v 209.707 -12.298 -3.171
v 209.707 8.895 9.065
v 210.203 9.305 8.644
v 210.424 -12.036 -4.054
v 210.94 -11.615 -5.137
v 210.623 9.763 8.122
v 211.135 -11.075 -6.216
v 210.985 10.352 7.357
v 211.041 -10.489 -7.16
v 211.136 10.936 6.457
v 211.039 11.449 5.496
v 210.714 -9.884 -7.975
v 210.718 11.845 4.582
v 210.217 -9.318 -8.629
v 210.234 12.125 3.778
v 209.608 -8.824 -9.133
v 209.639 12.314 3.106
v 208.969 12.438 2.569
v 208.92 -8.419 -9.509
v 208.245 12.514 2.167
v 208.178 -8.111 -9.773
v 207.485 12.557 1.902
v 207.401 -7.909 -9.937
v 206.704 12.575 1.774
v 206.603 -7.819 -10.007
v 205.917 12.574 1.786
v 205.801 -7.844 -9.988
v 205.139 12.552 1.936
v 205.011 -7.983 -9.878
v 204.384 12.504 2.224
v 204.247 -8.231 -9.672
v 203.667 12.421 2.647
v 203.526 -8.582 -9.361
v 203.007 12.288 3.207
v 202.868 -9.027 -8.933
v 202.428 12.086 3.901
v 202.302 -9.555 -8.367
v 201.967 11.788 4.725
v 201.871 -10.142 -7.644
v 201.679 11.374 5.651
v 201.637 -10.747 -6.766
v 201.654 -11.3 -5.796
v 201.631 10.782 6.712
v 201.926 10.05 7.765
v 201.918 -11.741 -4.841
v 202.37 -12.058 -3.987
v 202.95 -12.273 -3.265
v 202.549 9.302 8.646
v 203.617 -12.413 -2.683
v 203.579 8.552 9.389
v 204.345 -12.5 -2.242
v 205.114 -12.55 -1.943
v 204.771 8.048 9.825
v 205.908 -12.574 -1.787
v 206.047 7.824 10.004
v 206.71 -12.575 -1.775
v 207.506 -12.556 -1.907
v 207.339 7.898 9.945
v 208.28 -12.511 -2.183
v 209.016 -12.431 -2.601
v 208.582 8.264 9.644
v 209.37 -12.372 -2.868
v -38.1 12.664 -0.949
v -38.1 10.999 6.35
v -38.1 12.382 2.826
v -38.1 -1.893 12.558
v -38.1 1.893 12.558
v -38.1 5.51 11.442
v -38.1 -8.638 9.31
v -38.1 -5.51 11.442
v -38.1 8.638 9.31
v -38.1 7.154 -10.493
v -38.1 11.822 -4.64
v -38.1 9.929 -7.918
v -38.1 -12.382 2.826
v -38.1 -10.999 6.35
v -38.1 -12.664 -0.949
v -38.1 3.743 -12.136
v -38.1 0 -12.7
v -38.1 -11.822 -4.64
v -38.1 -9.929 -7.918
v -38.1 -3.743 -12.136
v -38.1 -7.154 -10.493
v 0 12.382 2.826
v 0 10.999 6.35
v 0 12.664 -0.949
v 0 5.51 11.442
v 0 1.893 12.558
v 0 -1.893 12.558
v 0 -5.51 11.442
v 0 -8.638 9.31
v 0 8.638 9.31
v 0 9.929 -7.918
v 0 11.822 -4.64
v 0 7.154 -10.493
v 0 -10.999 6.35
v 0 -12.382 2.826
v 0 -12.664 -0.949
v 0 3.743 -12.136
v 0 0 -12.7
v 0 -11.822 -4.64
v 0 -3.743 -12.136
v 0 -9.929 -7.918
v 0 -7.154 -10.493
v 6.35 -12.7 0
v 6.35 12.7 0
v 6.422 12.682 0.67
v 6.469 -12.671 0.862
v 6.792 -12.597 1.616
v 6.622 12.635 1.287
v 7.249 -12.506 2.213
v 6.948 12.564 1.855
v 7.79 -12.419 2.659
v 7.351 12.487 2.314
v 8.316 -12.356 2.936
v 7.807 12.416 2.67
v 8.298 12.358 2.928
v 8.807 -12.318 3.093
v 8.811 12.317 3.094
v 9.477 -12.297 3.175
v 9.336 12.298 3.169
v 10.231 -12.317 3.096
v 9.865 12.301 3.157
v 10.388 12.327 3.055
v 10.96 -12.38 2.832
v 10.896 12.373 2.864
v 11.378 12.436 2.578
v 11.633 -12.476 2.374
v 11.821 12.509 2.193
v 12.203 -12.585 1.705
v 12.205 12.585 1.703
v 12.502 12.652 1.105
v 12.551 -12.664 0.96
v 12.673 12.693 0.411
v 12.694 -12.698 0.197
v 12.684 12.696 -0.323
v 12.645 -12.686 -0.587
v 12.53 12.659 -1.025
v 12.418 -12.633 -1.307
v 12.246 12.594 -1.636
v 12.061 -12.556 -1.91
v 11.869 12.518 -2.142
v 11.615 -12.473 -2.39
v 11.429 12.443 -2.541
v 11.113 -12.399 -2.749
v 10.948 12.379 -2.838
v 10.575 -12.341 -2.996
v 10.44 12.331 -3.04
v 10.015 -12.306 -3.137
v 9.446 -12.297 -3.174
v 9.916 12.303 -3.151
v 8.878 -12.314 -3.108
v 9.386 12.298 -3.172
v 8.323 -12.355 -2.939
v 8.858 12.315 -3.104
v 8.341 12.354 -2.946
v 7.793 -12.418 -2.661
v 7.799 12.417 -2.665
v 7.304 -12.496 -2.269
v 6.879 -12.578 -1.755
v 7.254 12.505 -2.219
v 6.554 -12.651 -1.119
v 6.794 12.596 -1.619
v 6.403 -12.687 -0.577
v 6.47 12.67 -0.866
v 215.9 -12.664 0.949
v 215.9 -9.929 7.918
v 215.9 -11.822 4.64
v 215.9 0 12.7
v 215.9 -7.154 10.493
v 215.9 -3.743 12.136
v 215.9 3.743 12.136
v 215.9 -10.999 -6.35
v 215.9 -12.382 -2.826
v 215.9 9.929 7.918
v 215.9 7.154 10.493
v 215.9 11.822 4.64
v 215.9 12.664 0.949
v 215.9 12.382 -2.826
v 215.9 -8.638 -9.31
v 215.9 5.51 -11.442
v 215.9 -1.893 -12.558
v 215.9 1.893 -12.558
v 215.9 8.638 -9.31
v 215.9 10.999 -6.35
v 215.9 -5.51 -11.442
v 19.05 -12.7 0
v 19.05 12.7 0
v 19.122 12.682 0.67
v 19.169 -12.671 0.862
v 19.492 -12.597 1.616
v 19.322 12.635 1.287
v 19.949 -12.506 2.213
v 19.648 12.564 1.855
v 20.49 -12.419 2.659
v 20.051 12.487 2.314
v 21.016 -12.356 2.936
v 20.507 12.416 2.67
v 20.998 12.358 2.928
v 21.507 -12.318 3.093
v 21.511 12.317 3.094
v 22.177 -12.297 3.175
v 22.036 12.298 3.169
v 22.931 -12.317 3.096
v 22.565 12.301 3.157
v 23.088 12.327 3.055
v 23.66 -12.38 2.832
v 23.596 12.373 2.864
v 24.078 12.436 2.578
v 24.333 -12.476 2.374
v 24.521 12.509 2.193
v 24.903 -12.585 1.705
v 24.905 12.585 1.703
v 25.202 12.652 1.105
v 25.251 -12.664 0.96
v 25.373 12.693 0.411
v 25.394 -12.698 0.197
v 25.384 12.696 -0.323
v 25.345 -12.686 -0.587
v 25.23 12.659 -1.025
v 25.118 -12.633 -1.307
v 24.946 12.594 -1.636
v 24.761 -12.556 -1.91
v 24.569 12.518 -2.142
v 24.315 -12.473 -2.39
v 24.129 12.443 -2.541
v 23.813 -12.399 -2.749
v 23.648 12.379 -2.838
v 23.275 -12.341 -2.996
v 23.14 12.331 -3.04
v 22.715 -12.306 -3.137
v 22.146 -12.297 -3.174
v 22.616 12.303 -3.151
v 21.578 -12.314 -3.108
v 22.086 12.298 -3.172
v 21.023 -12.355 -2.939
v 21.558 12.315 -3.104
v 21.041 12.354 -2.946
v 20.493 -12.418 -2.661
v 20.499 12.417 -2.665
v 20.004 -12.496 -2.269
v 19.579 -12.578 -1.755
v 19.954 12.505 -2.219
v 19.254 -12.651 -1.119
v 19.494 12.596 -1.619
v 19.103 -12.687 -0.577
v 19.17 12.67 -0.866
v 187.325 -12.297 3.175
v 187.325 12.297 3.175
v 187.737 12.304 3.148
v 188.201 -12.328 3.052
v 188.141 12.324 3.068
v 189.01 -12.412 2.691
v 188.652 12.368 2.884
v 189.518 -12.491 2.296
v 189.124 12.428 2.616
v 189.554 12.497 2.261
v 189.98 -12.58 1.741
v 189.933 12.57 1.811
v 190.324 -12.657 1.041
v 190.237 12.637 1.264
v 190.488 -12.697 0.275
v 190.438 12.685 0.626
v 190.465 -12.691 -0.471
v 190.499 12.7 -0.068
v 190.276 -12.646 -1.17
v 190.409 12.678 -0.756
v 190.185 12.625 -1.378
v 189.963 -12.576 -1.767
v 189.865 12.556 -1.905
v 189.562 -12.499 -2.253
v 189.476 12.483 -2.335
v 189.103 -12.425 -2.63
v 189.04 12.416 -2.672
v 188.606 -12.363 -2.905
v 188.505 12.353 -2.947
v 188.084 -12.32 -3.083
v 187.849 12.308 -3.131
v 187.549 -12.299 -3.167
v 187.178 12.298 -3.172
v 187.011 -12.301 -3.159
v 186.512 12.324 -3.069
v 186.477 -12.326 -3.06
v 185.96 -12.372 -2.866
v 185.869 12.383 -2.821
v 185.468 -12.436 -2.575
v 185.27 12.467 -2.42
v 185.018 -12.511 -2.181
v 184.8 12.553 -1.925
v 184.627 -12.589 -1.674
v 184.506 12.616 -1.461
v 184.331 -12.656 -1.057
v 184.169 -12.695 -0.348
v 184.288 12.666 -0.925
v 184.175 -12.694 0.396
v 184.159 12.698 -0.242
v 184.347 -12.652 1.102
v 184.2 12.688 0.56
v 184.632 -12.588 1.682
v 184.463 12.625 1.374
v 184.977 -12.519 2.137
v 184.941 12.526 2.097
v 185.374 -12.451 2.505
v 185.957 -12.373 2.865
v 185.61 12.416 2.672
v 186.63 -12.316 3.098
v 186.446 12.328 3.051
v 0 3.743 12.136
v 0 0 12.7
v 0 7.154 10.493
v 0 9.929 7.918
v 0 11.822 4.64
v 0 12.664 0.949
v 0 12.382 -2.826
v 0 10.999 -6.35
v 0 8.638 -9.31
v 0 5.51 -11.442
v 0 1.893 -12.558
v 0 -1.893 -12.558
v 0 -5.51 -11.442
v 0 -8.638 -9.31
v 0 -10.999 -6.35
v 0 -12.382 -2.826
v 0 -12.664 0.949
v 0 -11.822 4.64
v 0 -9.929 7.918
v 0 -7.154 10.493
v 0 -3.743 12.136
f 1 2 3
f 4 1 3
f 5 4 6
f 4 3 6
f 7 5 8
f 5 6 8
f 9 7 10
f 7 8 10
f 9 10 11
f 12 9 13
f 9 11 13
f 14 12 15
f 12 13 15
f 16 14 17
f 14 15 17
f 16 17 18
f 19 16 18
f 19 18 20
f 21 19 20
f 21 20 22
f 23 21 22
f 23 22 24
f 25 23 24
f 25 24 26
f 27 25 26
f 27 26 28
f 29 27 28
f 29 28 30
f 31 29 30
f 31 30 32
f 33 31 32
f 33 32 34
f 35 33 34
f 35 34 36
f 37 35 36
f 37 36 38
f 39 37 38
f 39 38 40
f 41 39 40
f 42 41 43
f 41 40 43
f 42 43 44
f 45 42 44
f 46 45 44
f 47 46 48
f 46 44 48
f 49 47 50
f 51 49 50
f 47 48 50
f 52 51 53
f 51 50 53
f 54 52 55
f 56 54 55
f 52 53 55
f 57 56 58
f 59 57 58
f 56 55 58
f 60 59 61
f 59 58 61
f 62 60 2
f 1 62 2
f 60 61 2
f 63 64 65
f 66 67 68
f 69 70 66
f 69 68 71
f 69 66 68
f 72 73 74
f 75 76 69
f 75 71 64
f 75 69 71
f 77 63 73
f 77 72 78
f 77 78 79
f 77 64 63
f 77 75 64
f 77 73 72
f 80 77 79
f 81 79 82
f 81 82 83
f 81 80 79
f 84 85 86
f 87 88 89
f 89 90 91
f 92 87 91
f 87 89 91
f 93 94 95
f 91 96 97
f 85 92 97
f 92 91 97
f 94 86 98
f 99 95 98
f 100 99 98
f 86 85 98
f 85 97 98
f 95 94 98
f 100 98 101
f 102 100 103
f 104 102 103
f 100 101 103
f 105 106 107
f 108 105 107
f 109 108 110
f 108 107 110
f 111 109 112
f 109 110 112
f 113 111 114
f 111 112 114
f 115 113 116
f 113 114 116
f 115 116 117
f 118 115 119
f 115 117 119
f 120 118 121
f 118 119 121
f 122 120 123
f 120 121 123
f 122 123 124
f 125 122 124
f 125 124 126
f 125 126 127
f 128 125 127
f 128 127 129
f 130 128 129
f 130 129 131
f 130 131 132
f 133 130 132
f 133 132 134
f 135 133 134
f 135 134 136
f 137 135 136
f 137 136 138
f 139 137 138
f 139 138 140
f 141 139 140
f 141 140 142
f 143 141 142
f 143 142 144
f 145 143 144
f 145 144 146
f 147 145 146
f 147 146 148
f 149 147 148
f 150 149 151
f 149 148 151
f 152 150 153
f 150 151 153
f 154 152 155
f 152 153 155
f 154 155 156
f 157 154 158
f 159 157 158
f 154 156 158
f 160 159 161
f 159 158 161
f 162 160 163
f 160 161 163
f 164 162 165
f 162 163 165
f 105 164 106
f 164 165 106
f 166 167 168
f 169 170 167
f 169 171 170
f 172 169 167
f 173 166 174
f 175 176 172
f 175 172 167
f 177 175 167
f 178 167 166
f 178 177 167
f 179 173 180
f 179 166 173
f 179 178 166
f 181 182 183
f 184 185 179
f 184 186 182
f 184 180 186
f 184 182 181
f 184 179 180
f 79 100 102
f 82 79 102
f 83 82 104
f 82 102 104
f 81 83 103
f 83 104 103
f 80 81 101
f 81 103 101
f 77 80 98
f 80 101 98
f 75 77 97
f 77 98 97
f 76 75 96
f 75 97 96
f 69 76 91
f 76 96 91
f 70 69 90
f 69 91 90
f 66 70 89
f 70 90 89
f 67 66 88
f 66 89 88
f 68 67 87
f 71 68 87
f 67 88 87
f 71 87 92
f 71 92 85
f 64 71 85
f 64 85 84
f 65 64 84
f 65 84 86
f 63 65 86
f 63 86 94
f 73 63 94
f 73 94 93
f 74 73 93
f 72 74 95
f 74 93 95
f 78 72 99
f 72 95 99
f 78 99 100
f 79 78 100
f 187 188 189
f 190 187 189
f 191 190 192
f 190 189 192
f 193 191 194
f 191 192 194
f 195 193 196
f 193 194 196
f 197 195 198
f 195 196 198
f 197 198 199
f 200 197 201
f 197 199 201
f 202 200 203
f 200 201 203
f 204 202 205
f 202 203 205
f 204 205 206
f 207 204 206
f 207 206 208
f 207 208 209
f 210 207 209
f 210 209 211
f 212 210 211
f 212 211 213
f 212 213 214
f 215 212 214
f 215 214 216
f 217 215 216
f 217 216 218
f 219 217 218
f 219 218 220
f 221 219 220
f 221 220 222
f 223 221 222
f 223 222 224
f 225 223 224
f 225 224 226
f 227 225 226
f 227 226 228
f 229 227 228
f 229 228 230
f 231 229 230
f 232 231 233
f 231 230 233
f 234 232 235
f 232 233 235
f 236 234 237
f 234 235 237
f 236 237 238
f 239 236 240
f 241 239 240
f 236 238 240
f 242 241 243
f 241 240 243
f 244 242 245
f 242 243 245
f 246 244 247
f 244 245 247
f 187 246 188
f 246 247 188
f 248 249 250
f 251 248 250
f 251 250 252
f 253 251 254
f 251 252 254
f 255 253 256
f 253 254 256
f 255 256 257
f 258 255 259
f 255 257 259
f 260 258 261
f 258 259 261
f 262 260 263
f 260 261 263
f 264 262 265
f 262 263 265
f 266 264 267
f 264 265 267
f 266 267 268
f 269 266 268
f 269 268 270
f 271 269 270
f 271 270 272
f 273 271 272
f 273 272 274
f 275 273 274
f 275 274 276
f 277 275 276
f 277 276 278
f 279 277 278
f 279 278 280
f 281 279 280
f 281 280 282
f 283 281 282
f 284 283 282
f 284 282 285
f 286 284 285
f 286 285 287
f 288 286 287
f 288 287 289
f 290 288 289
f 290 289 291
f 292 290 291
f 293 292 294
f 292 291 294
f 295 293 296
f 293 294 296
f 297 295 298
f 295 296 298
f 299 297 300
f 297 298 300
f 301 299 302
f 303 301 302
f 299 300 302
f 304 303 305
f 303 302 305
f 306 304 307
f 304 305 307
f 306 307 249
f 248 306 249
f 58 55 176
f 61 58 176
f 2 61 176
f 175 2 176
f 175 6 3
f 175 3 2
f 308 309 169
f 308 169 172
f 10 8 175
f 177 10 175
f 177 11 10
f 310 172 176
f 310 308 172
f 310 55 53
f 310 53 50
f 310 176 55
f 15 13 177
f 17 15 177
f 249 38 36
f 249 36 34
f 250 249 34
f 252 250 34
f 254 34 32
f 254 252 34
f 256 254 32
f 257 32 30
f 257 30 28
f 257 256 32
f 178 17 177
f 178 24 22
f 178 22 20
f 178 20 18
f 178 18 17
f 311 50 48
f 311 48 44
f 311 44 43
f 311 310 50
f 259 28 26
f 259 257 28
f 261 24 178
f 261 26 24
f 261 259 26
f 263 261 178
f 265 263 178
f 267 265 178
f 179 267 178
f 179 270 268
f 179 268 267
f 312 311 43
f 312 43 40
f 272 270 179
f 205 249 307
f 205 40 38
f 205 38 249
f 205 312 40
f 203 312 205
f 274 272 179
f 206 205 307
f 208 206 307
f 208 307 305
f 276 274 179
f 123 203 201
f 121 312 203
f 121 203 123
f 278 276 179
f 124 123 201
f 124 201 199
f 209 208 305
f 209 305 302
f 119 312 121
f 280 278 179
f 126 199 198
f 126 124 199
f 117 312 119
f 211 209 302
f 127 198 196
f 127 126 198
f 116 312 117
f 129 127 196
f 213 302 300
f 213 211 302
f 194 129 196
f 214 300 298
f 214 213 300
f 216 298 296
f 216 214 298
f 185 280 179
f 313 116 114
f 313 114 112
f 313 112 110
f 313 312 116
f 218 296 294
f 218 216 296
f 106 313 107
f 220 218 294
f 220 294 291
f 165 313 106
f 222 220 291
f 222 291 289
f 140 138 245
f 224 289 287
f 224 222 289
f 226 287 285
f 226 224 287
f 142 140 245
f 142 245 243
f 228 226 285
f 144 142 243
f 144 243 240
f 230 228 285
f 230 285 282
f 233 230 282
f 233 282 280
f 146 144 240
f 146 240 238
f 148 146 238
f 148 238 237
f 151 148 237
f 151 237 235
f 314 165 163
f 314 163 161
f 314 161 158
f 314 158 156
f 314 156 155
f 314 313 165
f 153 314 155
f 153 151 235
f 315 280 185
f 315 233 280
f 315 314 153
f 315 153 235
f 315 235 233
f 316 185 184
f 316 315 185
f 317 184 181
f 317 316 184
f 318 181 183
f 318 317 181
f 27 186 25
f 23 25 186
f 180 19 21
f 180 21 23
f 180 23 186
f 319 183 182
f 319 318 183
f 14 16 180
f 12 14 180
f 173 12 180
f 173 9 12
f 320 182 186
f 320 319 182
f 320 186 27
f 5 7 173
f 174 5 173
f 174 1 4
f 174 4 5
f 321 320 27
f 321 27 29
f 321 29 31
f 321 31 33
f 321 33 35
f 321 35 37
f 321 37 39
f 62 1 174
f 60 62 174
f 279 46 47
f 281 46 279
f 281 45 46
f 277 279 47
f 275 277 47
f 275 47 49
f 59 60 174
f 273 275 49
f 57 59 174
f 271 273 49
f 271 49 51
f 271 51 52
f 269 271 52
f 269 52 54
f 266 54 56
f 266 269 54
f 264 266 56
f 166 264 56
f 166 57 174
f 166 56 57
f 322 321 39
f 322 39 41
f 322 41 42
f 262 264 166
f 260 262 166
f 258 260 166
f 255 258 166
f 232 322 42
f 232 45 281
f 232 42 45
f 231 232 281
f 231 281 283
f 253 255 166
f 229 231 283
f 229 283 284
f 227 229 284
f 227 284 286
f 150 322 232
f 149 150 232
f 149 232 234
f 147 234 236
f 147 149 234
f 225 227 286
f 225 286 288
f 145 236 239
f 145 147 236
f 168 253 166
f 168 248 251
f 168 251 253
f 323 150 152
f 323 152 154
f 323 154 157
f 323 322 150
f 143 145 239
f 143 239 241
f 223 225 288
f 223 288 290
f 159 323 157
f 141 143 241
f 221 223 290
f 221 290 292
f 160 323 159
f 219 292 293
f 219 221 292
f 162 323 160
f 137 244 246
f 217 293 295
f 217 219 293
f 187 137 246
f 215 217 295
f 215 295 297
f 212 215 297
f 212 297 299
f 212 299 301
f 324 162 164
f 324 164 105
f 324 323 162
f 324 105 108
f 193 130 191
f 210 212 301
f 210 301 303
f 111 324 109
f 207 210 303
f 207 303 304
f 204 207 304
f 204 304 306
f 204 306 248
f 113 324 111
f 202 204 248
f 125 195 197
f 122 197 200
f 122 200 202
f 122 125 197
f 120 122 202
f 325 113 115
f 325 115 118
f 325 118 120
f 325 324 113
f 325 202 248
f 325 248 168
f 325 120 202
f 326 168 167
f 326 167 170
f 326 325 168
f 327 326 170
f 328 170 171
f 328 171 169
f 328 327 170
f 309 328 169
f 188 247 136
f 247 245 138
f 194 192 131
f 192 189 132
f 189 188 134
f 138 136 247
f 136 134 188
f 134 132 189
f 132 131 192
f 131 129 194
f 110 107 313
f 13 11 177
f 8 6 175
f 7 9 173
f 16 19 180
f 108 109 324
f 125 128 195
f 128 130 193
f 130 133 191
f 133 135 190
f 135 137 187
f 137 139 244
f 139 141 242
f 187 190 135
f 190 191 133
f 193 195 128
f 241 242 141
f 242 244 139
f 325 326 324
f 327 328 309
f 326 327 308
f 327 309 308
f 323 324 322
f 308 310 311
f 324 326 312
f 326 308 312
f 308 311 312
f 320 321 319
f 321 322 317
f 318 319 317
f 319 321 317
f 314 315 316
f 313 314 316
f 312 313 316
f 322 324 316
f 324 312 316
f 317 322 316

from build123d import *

# Parameters (mm, degrees)
BOSS_EXTRUDE1_DEPTH = 215.9
SKETCH2_R           = 3.175
CUT_EXTRUDE1_DEPTH  = 215.9
SKETCH3_R           = 4.7625
CUT_EXTRUDE2_DEPTH  = 215.9
SKETCH4_R           = 25.43506898
SKETCH4_R_2         = 12.7
CUT_EXTRUDE6_DEPTH  = 222.25
SKETCH5_R           = 12.7
BOSS_EXTRUDE2_DEPTH = 38.1
SKETCH6_R           = 12.7
CUT_EXTRUDE7_DEPTH  = 38.1
SKETCH7_R           = 12.7
BOSS_EXTRUDE3_DEPTH = 38.1


with BuildPart() as part:
    # Sketch1 → Boss-Extrude1 (new body)
    with BuildSketch(Plane(origin=(0, 0, 0), x_dir=(0, 0, -1), z_dir=(1, 0, 0))):
        Polygon((12.7, 3.402954744), (9.297045256, 9.297045256), (3.402954744, 12.7), (-3.402954744, 12.7), (-9.297045256, 9.297045256), (-12.7, 3.402954744), (-12.7, -3.402954744), (-9.297045256, -9.297045256), (-3.402954744, -12.7), (3.402954744, -12.7), (9.297045256, -9.297045256), (12.7, -3.402954744), align=None)
    extrude(amount=BOSS_EXTRUDE1_DEPTH)

    # Sketch2 → Cut-Extrude1 (cut)
    with BuildSketch(Plane(origin=(0, 12.7, 0), x_dir=(1, 0, 0), z_dir=(0, 1, 0))):
        with BuildLine():
            ThreePointArc((25.4, 0), (22.225, 3.175), (19.05, 0))
            Line((19.05, 0), (22.225, 0))
            Line((22.225, 0), (25.4, 0))
        make_face()
        with BuildLine():
            Line((22.225, 0), (19.05, 0))
            ThreePointArc((19.05, 0), (22.225, -3.175), (25.4, 0))
            Line((25.4, 0), (22.225, 0))
        make_face()
        with BuildLine():
            ThreePointArc((12.7, 0), (9.525, 3.175), (6.35, 0))
            Line((6.35, 0), (9.525, 0))
            Line((9.525, 0), (12.7, 0))
        make_face()
        with BuildLine():
            Line((9.525, 0), (6.35, 0))
            ThreePointArc((6.35, 0), (9.525, -3.175), (12.7, 0))
            Line((12.7, 0), (9.525, 0))
        make_face()
        with Locations(Location((187.325, 0, 0), (0, 0, 270))):
            Circle(SKETCH2_R)
    extrude(amount=-CUT_EXTRUDE1_DEPTH, mode=Mode.SUBTRACT)

    # Sketch3 → Cut-Extrude2 (cut)
    with BuildSketch(Plane(origin=(0, 10.998522628, 6.35), x_dir=(1, 0, 0), z_dir=(0, 0.8660254037844386, 0.5000000000000001))):
        with Locations(Location((206.375, 0, 0), (0, 0, 314.395209186))):
            Circle(SKETCH3_R)
    extrude(amount=-CUT_EXTRUDE2_DEPTH, mode=Mode.SUBTRACT)

    # Sketch4 → Cut-Extrude6 (cut)
    with BuildSketch(Plane.ZY):
        Circle(SKETCH4_R)
        Circle(SKETCH4_R_2, mode=Mode.SUBTRACT)
    extrude(amount=-CUT_EXTRUDE6_DEPTH, mode=Mode.SUBTRACT)


with BuildPart() as body_2:
    # Sketch5 → Boss-Extrude2 (new body)
    with BuildSketch(Plane.ZY):
        Circle(SKETCH5_R)
    extrude(amount=BOSS_EXTRUDE2_DEPTH)

    # Sketch6 → Cut-Extrude7 (cut)
    with BuildSketch(Plane.ZY.offset(38.1)):
        Circle(SKETCH6_R)
    extrude(amount=-CUT_EXTRUDE7_DEPTH, mode=Mode.SUBTRACT)


with BuildPart() as body_2_2:
    # Sketch7 → Boss-Extrude3 (new body)
    with BuildSketch(Plane.ZY):
        with Locations(Location((0, 0, 0), (0, 0, 180))):
            Circle(SKETCH7_R)
    extrude(amount=BOSS_EXTRUDE3_DEPTH)


solid = Compound([part.part, body_2_2.part])
